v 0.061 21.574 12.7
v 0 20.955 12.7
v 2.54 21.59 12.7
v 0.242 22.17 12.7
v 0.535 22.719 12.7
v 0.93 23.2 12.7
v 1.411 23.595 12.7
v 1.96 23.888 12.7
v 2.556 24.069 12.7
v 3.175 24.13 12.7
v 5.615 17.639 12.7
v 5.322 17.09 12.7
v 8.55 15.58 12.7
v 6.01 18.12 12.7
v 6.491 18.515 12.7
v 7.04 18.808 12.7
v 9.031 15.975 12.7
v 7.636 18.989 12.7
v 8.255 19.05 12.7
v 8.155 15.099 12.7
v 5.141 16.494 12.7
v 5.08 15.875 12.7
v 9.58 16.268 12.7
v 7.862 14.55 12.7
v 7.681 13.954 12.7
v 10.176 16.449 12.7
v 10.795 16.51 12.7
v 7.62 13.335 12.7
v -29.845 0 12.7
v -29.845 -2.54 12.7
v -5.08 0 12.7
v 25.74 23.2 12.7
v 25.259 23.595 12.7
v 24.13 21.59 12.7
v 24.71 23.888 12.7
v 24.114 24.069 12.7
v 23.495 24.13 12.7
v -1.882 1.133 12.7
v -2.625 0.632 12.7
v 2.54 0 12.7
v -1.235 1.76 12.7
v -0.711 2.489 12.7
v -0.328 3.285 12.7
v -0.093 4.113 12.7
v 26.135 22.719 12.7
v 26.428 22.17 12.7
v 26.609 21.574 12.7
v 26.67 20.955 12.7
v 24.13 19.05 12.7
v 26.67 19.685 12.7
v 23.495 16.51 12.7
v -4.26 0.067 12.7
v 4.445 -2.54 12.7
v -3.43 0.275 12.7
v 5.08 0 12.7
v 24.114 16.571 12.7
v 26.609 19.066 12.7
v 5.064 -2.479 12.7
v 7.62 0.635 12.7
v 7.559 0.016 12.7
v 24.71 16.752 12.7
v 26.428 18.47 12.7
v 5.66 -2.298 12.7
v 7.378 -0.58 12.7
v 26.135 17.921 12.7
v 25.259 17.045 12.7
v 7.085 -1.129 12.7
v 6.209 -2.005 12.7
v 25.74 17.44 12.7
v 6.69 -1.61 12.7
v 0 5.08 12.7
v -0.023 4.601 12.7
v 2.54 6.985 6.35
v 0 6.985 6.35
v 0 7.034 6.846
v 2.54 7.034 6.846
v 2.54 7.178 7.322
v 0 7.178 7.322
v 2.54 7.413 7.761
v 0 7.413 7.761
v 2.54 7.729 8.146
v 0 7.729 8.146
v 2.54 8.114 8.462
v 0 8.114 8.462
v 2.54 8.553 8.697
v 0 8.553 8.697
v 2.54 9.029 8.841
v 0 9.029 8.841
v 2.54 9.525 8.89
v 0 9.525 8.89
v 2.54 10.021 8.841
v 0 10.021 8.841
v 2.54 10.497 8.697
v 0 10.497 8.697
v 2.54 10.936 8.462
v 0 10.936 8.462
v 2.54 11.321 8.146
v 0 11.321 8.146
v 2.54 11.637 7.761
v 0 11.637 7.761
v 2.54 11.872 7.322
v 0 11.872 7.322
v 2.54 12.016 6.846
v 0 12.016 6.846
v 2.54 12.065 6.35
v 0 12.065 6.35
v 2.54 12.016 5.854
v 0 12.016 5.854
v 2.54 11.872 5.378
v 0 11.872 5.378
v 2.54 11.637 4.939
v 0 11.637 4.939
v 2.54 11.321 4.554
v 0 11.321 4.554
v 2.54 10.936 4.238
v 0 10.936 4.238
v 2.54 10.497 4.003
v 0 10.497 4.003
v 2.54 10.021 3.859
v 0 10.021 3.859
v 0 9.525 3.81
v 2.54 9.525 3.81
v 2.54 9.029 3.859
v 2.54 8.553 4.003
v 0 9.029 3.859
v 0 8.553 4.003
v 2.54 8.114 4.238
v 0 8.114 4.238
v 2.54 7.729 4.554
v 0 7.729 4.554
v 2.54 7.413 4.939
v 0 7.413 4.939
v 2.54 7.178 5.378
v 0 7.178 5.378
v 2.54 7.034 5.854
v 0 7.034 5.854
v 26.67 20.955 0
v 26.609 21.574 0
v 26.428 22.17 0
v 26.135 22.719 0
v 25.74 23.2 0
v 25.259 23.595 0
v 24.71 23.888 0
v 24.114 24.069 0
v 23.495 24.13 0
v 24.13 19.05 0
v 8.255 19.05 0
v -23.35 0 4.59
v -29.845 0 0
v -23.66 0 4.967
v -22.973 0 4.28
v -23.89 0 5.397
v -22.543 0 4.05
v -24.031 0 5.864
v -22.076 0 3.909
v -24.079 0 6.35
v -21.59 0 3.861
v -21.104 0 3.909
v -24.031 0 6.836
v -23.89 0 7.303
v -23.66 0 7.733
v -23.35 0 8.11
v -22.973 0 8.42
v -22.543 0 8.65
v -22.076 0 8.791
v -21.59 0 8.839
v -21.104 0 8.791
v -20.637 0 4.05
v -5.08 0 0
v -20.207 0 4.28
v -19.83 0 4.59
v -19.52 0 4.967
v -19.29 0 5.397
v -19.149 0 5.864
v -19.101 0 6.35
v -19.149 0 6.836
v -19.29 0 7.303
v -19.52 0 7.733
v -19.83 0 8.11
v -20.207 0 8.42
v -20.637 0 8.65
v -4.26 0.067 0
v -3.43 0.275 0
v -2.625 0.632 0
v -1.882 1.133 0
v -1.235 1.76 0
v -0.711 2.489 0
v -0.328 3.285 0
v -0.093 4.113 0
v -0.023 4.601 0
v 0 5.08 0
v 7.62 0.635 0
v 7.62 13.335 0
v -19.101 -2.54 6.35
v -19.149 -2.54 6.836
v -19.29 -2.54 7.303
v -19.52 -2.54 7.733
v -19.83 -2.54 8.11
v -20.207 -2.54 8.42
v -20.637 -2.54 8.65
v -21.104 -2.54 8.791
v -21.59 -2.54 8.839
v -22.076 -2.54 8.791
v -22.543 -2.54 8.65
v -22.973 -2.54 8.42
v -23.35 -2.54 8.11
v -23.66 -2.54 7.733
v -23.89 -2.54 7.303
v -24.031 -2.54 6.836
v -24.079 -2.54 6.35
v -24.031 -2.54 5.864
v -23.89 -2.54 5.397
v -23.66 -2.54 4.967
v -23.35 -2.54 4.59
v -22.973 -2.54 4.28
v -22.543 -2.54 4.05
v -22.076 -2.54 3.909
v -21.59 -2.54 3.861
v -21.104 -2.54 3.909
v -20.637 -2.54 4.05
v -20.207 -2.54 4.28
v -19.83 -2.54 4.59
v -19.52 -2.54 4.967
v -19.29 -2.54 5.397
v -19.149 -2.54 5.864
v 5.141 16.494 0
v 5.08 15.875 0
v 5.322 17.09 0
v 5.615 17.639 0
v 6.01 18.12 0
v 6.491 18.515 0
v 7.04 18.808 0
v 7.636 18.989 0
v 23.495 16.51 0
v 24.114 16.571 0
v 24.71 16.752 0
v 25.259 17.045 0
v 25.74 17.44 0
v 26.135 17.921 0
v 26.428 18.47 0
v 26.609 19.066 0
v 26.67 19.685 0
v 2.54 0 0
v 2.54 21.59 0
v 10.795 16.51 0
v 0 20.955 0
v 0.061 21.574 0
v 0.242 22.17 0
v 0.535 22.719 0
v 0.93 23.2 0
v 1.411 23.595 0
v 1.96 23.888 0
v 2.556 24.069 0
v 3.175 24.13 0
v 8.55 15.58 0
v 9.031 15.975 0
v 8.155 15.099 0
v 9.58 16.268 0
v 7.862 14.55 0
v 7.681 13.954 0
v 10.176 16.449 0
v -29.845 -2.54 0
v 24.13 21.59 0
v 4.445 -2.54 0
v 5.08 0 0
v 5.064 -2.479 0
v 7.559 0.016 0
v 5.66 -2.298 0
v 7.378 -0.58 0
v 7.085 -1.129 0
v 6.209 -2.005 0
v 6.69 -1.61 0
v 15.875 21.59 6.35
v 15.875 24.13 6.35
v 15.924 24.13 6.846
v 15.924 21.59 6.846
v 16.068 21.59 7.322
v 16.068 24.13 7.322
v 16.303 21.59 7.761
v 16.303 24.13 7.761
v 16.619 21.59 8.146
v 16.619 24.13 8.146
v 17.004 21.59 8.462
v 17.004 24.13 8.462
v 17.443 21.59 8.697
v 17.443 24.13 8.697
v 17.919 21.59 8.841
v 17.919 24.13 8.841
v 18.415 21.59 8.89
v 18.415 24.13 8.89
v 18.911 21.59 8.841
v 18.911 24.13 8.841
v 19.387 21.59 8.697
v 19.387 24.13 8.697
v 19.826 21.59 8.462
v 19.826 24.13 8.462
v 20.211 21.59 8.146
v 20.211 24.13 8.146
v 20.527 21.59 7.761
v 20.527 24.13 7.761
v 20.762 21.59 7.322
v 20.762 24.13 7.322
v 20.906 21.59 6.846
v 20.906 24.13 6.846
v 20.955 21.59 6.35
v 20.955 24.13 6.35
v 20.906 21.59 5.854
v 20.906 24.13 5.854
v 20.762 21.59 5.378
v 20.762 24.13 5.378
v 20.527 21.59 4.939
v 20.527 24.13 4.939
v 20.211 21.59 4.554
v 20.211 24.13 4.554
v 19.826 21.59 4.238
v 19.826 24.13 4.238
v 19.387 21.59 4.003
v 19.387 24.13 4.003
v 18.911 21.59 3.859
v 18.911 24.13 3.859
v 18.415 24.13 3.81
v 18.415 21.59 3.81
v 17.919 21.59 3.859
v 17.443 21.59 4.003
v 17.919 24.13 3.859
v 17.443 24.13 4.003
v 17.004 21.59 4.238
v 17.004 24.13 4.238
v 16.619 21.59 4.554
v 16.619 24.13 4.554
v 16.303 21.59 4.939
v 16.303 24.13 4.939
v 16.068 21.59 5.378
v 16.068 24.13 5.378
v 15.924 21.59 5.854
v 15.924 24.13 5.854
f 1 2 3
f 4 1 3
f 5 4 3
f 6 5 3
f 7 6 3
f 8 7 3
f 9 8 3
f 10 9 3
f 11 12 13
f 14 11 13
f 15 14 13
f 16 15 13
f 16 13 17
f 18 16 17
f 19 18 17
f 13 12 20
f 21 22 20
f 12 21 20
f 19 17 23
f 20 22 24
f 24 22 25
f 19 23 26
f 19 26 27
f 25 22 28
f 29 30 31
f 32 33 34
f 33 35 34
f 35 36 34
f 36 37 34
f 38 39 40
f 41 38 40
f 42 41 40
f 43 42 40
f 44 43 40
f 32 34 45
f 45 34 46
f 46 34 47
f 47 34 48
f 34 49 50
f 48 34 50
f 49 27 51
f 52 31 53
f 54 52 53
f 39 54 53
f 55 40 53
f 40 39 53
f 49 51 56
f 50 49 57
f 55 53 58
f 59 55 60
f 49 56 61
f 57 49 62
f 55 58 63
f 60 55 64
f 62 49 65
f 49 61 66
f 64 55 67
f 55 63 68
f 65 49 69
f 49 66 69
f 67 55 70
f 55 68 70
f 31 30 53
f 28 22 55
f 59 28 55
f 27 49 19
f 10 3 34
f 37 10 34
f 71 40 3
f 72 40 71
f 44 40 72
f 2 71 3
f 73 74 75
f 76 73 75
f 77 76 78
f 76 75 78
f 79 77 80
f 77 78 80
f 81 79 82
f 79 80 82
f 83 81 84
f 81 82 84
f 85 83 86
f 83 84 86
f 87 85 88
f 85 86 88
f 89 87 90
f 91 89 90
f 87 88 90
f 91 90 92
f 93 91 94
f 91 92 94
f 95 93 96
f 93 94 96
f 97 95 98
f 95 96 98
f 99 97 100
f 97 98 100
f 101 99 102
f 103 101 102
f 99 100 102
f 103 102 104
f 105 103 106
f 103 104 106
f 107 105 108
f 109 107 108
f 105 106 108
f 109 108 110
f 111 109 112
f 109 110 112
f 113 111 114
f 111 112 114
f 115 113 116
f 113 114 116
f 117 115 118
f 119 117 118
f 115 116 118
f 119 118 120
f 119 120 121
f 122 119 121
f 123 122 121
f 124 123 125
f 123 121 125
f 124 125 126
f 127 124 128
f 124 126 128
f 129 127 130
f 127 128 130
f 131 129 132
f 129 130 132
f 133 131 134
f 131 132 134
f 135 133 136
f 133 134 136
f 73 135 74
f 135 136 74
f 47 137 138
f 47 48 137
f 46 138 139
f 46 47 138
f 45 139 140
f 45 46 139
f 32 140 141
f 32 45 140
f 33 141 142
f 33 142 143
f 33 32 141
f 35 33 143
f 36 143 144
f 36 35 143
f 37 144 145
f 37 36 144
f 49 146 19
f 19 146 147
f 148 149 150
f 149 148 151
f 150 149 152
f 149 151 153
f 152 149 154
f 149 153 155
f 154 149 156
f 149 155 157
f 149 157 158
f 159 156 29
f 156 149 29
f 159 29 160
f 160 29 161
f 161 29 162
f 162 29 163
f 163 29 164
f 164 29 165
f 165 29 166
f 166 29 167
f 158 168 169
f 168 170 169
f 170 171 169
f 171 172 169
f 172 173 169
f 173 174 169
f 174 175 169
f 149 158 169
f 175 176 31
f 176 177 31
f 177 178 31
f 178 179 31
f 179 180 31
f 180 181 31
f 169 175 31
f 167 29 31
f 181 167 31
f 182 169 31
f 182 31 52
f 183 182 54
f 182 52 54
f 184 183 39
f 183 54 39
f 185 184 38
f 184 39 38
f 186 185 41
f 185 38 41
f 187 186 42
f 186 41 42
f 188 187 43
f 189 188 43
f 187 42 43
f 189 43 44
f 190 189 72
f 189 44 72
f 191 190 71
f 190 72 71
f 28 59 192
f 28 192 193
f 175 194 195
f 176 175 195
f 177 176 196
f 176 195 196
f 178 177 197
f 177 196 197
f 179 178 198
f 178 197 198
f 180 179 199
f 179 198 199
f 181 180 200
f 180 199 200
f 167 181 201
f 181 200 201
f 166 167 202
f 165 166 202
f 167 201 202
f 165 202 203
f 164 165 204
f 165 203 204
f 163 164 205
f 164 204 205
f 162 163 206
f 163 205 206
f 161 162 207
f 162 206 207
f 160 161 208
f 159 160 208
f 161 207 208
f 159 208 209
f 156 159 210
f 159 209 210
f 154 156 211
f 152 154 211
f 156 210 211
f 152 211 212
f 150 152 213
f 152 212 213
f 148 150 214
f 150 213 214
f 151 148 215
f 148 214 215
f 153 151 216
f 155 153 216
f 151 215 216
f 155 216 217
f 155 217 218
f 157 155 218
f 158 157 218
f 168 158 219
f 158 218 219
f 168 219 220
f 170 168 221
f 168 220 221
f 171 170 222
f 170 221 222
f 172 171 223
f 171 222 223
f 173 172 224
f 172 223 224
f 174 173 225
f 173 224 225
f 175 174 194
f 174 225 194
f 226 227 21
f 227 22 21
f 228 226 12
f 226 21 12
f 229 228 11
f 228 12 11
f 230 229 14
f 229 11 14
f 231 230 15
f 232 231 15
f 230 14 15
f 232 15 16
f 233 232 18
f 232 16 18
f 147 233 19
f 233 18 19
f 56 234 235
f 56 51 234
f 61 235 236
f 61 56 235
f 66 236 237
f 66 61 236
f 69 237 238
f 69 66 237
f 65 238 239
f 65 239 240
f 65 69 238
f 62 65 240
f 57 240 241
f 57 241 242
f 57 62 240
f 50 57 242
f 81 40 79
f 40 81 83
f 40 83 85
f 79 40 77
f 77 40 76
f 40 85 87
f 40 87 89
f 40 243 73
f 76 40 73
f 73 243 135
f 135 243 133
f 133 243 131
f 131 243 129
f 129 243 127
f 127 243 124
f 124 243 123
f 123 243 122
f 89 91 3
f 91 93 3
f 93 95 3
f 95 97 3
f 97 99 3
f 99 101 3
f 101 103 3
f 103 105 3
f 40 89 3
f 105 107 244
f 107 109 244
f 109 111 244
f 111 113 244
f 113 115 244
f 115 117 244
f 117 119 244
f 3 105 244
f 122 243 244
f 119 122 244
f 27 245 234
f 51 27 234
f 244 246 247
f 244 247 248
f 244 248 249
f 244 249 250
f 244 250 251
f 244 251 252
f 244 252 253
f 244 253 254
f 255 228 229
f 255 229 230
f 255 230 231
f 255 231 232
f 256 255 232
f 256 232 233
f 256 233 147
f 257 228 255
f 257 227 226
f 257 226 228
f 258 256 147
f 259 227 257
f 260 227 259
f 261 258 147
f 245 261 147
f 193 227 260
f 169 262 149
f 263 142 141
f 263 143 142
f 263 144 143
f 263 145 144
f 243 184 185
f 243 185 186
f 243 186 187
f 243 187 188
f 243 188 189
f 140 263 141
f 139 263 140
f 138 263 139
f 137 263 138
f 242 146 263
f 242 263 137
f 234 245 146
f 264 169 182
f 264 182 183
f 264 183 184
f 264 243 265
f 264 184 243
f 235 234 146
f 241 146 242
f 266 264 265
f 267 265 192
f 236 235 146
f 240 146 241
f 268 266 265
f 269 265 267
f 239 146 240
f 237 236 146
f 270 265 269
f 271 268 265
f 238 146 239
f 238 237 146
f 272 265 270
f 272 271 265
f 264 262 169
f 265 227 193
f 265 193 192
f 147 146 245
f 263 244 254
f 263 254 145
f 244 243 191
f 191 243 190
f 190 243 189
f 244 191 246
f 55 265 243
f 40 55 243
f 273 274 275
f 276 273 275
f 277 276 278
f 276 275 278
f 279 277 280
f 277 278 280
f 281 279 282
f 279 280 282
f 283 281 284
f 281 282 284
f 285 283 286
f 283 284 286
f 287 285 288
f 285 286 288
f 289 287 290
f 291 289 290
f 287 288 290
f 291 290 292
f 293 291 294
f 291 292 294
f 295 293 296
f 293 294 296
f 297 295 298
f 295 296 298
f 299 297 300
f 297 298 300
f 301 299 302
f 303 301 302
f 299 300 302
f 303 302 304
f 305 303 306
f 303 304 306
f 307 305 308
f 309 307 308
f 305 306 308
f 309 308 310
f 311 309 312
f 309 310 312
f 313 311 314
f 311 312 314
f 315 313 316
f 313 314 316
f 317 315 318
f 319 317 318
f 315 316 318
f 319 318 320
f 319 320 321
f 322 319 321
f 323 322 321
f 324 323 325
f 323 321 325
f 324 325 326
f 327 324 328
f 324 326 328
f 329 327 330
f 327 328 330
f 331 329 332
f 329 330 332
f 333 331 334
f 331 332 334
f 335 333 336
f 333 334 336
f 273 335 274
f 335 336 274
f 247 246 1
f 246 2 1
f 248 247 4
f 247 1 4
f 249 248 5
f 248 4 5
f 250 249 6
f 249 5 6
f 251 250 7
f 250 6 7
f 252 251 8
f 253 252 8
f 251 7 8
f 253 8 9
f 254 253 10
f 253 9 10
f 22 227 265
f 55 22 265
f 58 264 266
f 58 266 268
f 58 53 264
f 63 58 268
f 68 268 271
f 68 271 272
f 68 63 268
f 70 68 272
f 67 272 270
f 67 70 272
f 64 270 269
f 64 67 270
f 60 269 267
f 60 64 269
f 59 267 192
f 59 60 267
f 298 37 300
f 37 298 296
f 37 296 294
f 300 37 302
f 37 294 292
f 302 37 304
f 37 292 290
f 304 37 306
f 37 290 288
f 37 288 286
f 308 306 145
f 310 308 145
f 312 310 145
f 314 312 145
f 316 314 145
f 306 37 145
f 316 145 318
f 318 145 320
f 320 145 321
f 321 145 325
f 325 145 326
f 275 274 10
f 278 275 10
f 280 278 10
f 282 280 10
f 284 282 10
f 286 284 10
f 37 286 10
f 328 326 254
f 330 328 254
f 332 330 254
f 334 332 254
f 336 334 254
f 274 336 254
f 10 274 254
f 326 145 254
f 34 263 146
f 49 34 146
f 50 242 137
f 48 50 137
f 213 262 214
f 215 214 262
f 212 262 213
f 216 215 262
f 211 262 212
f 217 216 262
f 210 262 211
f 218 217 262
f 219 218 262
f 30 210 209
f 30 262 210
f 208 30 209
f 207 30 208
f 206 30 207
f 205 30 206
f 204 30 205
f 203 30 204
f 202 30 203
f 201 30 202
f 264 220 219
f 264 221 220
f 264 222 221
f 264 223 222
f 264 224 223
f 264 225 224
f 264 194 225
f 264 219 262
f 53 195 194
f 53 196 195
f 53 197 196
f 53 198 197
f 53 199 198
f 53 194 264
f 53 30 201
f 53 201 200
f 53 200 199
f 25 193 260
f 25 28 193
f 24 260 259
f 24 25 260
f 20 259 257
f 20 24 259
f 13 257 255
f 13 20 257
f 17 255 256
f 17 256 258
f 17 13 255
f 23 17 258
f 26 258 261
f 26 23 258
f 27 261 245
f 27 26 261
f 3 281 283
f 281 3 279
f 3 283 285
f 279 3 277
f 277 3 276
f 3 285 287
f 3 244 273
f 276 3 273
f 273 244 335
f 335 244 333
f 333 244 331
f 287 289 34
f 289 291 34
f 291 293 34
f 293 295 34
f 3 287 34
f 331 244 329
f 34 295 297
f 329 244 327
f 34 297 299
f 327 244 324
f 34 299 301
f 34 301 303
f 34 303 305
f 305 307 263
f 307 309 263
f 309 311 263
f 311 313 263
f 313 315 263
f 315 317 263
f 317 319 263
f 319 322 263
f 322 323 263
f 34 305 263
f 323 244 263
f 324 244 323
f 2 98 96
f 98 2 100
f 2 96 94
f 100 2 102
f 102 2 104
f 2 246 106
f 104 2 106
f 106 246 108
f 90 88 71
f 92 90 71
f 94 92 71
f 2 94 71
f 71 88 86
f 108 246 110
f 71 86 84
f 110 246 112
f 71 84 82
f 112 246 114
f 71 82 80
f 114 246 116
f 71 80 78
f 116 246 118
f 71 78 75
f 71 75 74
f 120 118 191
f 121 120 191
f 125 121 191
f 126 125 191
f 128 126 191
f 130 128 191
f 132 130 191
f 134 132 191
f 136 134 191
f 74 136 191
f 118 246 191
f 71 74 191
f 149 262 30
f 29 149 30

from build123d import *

# Parameters (mm, degrees)
F1_DEPTH  = 12.7
F2_R      = 3.175
F3_W      = 33.02
F3_H      = 12.7
F4_DEPTH  = 2.54
F5_R      = 5.08
F6_R      = 2.4892
F7_DEPTH  = 2.54
F8_R      = 2.54
F9_DEPTH  = 2.54
F10_R     = 2.54
F11_DEPTH = 2.54


with BuildPart() as f1:
    # F0 (on Top) → F1 (new body)
    with BuildSketch(Plane.XY):
        Polygon((0, 24.13), (0, -2.1948770154), (0, -2.54), (7.62, -2.54), (7.62, 16.51), (26.67, 16.51), (26.67, 24.13), align=None)
        Polygon((5.08, 0), (2.54, 0), (2.54, 21.59), (5.08, 21.59), (24.13, 21.59), (24.13, 19.05), (5.08, 19.05), align=None, mode=Mode.SUBTRACT)
    extrude(amount=F1_DEPTH)

    # F2
    f2_edges = [f1.edges().sort_by_distance(p)[0] for p in [
        (26.67, 24.13, 6.35),
        (26.67, 16.51, 6.35),
        (5.08, 19.05, 6.35),
        (0, 24.13, 6.35),
        (7.62, -2.54, 6.35),
        (0, -2.54, 6.35),
        (7.62, 16.51, 6.35),
    ]]
    fillet(f2_edges, radius=F2_R)

    # F3 (on face) → F4 (join)
    with BuildSketch(Plane.XZ.offset(2.54)):
        with Locations((-13.335, 6.35)):
            Rectangle(F3_W, F3_H)
    extrude(amount=-F4_DEPTH)

    # F5
    f5_edges = [f1.edges().sort_by_distance(p)[0] for p in [
        (0.064148, 0, 6.35),
    ]]
    fillet(f5_edges, radius=F5_R)

    # F6 (on face) → F7 (cut, through all)
    with BuildSketch(Plane.XZ.offset(2.54)):
        with Locations((-21.59, 6.35)):
            Circle(F6_R)
    extrude(amount=-F7_DEPTH, mode=Mode.SUBTRACT)

    # F8 (on face) → F9 (cut, through all)
    with BuildSketch(Plane(origin=(0, 24.13, 0), x_dir=(-1, 0, 0), z_dir=(0, 1, 0))):
        with Locations((-18.415, 6.35)):
            Circle(F8_R)
    extrude(amount=-F9_DEPTH, mode=Mode.SUBTRACT)

    # F10 (on face) → F11 (cut, through all)
    with BuildSketch(Plane(origin=(0, 0, 0), x_dir=(0, -1, 0), z_dir=(-1, 0, 0))):
        with Locations((-9.525, 6.35)):
            Circle(F10_R)
    extrude(amount=-F11_DEPTH, mode=Mode.SUBTRACT)


solid = f1.part
